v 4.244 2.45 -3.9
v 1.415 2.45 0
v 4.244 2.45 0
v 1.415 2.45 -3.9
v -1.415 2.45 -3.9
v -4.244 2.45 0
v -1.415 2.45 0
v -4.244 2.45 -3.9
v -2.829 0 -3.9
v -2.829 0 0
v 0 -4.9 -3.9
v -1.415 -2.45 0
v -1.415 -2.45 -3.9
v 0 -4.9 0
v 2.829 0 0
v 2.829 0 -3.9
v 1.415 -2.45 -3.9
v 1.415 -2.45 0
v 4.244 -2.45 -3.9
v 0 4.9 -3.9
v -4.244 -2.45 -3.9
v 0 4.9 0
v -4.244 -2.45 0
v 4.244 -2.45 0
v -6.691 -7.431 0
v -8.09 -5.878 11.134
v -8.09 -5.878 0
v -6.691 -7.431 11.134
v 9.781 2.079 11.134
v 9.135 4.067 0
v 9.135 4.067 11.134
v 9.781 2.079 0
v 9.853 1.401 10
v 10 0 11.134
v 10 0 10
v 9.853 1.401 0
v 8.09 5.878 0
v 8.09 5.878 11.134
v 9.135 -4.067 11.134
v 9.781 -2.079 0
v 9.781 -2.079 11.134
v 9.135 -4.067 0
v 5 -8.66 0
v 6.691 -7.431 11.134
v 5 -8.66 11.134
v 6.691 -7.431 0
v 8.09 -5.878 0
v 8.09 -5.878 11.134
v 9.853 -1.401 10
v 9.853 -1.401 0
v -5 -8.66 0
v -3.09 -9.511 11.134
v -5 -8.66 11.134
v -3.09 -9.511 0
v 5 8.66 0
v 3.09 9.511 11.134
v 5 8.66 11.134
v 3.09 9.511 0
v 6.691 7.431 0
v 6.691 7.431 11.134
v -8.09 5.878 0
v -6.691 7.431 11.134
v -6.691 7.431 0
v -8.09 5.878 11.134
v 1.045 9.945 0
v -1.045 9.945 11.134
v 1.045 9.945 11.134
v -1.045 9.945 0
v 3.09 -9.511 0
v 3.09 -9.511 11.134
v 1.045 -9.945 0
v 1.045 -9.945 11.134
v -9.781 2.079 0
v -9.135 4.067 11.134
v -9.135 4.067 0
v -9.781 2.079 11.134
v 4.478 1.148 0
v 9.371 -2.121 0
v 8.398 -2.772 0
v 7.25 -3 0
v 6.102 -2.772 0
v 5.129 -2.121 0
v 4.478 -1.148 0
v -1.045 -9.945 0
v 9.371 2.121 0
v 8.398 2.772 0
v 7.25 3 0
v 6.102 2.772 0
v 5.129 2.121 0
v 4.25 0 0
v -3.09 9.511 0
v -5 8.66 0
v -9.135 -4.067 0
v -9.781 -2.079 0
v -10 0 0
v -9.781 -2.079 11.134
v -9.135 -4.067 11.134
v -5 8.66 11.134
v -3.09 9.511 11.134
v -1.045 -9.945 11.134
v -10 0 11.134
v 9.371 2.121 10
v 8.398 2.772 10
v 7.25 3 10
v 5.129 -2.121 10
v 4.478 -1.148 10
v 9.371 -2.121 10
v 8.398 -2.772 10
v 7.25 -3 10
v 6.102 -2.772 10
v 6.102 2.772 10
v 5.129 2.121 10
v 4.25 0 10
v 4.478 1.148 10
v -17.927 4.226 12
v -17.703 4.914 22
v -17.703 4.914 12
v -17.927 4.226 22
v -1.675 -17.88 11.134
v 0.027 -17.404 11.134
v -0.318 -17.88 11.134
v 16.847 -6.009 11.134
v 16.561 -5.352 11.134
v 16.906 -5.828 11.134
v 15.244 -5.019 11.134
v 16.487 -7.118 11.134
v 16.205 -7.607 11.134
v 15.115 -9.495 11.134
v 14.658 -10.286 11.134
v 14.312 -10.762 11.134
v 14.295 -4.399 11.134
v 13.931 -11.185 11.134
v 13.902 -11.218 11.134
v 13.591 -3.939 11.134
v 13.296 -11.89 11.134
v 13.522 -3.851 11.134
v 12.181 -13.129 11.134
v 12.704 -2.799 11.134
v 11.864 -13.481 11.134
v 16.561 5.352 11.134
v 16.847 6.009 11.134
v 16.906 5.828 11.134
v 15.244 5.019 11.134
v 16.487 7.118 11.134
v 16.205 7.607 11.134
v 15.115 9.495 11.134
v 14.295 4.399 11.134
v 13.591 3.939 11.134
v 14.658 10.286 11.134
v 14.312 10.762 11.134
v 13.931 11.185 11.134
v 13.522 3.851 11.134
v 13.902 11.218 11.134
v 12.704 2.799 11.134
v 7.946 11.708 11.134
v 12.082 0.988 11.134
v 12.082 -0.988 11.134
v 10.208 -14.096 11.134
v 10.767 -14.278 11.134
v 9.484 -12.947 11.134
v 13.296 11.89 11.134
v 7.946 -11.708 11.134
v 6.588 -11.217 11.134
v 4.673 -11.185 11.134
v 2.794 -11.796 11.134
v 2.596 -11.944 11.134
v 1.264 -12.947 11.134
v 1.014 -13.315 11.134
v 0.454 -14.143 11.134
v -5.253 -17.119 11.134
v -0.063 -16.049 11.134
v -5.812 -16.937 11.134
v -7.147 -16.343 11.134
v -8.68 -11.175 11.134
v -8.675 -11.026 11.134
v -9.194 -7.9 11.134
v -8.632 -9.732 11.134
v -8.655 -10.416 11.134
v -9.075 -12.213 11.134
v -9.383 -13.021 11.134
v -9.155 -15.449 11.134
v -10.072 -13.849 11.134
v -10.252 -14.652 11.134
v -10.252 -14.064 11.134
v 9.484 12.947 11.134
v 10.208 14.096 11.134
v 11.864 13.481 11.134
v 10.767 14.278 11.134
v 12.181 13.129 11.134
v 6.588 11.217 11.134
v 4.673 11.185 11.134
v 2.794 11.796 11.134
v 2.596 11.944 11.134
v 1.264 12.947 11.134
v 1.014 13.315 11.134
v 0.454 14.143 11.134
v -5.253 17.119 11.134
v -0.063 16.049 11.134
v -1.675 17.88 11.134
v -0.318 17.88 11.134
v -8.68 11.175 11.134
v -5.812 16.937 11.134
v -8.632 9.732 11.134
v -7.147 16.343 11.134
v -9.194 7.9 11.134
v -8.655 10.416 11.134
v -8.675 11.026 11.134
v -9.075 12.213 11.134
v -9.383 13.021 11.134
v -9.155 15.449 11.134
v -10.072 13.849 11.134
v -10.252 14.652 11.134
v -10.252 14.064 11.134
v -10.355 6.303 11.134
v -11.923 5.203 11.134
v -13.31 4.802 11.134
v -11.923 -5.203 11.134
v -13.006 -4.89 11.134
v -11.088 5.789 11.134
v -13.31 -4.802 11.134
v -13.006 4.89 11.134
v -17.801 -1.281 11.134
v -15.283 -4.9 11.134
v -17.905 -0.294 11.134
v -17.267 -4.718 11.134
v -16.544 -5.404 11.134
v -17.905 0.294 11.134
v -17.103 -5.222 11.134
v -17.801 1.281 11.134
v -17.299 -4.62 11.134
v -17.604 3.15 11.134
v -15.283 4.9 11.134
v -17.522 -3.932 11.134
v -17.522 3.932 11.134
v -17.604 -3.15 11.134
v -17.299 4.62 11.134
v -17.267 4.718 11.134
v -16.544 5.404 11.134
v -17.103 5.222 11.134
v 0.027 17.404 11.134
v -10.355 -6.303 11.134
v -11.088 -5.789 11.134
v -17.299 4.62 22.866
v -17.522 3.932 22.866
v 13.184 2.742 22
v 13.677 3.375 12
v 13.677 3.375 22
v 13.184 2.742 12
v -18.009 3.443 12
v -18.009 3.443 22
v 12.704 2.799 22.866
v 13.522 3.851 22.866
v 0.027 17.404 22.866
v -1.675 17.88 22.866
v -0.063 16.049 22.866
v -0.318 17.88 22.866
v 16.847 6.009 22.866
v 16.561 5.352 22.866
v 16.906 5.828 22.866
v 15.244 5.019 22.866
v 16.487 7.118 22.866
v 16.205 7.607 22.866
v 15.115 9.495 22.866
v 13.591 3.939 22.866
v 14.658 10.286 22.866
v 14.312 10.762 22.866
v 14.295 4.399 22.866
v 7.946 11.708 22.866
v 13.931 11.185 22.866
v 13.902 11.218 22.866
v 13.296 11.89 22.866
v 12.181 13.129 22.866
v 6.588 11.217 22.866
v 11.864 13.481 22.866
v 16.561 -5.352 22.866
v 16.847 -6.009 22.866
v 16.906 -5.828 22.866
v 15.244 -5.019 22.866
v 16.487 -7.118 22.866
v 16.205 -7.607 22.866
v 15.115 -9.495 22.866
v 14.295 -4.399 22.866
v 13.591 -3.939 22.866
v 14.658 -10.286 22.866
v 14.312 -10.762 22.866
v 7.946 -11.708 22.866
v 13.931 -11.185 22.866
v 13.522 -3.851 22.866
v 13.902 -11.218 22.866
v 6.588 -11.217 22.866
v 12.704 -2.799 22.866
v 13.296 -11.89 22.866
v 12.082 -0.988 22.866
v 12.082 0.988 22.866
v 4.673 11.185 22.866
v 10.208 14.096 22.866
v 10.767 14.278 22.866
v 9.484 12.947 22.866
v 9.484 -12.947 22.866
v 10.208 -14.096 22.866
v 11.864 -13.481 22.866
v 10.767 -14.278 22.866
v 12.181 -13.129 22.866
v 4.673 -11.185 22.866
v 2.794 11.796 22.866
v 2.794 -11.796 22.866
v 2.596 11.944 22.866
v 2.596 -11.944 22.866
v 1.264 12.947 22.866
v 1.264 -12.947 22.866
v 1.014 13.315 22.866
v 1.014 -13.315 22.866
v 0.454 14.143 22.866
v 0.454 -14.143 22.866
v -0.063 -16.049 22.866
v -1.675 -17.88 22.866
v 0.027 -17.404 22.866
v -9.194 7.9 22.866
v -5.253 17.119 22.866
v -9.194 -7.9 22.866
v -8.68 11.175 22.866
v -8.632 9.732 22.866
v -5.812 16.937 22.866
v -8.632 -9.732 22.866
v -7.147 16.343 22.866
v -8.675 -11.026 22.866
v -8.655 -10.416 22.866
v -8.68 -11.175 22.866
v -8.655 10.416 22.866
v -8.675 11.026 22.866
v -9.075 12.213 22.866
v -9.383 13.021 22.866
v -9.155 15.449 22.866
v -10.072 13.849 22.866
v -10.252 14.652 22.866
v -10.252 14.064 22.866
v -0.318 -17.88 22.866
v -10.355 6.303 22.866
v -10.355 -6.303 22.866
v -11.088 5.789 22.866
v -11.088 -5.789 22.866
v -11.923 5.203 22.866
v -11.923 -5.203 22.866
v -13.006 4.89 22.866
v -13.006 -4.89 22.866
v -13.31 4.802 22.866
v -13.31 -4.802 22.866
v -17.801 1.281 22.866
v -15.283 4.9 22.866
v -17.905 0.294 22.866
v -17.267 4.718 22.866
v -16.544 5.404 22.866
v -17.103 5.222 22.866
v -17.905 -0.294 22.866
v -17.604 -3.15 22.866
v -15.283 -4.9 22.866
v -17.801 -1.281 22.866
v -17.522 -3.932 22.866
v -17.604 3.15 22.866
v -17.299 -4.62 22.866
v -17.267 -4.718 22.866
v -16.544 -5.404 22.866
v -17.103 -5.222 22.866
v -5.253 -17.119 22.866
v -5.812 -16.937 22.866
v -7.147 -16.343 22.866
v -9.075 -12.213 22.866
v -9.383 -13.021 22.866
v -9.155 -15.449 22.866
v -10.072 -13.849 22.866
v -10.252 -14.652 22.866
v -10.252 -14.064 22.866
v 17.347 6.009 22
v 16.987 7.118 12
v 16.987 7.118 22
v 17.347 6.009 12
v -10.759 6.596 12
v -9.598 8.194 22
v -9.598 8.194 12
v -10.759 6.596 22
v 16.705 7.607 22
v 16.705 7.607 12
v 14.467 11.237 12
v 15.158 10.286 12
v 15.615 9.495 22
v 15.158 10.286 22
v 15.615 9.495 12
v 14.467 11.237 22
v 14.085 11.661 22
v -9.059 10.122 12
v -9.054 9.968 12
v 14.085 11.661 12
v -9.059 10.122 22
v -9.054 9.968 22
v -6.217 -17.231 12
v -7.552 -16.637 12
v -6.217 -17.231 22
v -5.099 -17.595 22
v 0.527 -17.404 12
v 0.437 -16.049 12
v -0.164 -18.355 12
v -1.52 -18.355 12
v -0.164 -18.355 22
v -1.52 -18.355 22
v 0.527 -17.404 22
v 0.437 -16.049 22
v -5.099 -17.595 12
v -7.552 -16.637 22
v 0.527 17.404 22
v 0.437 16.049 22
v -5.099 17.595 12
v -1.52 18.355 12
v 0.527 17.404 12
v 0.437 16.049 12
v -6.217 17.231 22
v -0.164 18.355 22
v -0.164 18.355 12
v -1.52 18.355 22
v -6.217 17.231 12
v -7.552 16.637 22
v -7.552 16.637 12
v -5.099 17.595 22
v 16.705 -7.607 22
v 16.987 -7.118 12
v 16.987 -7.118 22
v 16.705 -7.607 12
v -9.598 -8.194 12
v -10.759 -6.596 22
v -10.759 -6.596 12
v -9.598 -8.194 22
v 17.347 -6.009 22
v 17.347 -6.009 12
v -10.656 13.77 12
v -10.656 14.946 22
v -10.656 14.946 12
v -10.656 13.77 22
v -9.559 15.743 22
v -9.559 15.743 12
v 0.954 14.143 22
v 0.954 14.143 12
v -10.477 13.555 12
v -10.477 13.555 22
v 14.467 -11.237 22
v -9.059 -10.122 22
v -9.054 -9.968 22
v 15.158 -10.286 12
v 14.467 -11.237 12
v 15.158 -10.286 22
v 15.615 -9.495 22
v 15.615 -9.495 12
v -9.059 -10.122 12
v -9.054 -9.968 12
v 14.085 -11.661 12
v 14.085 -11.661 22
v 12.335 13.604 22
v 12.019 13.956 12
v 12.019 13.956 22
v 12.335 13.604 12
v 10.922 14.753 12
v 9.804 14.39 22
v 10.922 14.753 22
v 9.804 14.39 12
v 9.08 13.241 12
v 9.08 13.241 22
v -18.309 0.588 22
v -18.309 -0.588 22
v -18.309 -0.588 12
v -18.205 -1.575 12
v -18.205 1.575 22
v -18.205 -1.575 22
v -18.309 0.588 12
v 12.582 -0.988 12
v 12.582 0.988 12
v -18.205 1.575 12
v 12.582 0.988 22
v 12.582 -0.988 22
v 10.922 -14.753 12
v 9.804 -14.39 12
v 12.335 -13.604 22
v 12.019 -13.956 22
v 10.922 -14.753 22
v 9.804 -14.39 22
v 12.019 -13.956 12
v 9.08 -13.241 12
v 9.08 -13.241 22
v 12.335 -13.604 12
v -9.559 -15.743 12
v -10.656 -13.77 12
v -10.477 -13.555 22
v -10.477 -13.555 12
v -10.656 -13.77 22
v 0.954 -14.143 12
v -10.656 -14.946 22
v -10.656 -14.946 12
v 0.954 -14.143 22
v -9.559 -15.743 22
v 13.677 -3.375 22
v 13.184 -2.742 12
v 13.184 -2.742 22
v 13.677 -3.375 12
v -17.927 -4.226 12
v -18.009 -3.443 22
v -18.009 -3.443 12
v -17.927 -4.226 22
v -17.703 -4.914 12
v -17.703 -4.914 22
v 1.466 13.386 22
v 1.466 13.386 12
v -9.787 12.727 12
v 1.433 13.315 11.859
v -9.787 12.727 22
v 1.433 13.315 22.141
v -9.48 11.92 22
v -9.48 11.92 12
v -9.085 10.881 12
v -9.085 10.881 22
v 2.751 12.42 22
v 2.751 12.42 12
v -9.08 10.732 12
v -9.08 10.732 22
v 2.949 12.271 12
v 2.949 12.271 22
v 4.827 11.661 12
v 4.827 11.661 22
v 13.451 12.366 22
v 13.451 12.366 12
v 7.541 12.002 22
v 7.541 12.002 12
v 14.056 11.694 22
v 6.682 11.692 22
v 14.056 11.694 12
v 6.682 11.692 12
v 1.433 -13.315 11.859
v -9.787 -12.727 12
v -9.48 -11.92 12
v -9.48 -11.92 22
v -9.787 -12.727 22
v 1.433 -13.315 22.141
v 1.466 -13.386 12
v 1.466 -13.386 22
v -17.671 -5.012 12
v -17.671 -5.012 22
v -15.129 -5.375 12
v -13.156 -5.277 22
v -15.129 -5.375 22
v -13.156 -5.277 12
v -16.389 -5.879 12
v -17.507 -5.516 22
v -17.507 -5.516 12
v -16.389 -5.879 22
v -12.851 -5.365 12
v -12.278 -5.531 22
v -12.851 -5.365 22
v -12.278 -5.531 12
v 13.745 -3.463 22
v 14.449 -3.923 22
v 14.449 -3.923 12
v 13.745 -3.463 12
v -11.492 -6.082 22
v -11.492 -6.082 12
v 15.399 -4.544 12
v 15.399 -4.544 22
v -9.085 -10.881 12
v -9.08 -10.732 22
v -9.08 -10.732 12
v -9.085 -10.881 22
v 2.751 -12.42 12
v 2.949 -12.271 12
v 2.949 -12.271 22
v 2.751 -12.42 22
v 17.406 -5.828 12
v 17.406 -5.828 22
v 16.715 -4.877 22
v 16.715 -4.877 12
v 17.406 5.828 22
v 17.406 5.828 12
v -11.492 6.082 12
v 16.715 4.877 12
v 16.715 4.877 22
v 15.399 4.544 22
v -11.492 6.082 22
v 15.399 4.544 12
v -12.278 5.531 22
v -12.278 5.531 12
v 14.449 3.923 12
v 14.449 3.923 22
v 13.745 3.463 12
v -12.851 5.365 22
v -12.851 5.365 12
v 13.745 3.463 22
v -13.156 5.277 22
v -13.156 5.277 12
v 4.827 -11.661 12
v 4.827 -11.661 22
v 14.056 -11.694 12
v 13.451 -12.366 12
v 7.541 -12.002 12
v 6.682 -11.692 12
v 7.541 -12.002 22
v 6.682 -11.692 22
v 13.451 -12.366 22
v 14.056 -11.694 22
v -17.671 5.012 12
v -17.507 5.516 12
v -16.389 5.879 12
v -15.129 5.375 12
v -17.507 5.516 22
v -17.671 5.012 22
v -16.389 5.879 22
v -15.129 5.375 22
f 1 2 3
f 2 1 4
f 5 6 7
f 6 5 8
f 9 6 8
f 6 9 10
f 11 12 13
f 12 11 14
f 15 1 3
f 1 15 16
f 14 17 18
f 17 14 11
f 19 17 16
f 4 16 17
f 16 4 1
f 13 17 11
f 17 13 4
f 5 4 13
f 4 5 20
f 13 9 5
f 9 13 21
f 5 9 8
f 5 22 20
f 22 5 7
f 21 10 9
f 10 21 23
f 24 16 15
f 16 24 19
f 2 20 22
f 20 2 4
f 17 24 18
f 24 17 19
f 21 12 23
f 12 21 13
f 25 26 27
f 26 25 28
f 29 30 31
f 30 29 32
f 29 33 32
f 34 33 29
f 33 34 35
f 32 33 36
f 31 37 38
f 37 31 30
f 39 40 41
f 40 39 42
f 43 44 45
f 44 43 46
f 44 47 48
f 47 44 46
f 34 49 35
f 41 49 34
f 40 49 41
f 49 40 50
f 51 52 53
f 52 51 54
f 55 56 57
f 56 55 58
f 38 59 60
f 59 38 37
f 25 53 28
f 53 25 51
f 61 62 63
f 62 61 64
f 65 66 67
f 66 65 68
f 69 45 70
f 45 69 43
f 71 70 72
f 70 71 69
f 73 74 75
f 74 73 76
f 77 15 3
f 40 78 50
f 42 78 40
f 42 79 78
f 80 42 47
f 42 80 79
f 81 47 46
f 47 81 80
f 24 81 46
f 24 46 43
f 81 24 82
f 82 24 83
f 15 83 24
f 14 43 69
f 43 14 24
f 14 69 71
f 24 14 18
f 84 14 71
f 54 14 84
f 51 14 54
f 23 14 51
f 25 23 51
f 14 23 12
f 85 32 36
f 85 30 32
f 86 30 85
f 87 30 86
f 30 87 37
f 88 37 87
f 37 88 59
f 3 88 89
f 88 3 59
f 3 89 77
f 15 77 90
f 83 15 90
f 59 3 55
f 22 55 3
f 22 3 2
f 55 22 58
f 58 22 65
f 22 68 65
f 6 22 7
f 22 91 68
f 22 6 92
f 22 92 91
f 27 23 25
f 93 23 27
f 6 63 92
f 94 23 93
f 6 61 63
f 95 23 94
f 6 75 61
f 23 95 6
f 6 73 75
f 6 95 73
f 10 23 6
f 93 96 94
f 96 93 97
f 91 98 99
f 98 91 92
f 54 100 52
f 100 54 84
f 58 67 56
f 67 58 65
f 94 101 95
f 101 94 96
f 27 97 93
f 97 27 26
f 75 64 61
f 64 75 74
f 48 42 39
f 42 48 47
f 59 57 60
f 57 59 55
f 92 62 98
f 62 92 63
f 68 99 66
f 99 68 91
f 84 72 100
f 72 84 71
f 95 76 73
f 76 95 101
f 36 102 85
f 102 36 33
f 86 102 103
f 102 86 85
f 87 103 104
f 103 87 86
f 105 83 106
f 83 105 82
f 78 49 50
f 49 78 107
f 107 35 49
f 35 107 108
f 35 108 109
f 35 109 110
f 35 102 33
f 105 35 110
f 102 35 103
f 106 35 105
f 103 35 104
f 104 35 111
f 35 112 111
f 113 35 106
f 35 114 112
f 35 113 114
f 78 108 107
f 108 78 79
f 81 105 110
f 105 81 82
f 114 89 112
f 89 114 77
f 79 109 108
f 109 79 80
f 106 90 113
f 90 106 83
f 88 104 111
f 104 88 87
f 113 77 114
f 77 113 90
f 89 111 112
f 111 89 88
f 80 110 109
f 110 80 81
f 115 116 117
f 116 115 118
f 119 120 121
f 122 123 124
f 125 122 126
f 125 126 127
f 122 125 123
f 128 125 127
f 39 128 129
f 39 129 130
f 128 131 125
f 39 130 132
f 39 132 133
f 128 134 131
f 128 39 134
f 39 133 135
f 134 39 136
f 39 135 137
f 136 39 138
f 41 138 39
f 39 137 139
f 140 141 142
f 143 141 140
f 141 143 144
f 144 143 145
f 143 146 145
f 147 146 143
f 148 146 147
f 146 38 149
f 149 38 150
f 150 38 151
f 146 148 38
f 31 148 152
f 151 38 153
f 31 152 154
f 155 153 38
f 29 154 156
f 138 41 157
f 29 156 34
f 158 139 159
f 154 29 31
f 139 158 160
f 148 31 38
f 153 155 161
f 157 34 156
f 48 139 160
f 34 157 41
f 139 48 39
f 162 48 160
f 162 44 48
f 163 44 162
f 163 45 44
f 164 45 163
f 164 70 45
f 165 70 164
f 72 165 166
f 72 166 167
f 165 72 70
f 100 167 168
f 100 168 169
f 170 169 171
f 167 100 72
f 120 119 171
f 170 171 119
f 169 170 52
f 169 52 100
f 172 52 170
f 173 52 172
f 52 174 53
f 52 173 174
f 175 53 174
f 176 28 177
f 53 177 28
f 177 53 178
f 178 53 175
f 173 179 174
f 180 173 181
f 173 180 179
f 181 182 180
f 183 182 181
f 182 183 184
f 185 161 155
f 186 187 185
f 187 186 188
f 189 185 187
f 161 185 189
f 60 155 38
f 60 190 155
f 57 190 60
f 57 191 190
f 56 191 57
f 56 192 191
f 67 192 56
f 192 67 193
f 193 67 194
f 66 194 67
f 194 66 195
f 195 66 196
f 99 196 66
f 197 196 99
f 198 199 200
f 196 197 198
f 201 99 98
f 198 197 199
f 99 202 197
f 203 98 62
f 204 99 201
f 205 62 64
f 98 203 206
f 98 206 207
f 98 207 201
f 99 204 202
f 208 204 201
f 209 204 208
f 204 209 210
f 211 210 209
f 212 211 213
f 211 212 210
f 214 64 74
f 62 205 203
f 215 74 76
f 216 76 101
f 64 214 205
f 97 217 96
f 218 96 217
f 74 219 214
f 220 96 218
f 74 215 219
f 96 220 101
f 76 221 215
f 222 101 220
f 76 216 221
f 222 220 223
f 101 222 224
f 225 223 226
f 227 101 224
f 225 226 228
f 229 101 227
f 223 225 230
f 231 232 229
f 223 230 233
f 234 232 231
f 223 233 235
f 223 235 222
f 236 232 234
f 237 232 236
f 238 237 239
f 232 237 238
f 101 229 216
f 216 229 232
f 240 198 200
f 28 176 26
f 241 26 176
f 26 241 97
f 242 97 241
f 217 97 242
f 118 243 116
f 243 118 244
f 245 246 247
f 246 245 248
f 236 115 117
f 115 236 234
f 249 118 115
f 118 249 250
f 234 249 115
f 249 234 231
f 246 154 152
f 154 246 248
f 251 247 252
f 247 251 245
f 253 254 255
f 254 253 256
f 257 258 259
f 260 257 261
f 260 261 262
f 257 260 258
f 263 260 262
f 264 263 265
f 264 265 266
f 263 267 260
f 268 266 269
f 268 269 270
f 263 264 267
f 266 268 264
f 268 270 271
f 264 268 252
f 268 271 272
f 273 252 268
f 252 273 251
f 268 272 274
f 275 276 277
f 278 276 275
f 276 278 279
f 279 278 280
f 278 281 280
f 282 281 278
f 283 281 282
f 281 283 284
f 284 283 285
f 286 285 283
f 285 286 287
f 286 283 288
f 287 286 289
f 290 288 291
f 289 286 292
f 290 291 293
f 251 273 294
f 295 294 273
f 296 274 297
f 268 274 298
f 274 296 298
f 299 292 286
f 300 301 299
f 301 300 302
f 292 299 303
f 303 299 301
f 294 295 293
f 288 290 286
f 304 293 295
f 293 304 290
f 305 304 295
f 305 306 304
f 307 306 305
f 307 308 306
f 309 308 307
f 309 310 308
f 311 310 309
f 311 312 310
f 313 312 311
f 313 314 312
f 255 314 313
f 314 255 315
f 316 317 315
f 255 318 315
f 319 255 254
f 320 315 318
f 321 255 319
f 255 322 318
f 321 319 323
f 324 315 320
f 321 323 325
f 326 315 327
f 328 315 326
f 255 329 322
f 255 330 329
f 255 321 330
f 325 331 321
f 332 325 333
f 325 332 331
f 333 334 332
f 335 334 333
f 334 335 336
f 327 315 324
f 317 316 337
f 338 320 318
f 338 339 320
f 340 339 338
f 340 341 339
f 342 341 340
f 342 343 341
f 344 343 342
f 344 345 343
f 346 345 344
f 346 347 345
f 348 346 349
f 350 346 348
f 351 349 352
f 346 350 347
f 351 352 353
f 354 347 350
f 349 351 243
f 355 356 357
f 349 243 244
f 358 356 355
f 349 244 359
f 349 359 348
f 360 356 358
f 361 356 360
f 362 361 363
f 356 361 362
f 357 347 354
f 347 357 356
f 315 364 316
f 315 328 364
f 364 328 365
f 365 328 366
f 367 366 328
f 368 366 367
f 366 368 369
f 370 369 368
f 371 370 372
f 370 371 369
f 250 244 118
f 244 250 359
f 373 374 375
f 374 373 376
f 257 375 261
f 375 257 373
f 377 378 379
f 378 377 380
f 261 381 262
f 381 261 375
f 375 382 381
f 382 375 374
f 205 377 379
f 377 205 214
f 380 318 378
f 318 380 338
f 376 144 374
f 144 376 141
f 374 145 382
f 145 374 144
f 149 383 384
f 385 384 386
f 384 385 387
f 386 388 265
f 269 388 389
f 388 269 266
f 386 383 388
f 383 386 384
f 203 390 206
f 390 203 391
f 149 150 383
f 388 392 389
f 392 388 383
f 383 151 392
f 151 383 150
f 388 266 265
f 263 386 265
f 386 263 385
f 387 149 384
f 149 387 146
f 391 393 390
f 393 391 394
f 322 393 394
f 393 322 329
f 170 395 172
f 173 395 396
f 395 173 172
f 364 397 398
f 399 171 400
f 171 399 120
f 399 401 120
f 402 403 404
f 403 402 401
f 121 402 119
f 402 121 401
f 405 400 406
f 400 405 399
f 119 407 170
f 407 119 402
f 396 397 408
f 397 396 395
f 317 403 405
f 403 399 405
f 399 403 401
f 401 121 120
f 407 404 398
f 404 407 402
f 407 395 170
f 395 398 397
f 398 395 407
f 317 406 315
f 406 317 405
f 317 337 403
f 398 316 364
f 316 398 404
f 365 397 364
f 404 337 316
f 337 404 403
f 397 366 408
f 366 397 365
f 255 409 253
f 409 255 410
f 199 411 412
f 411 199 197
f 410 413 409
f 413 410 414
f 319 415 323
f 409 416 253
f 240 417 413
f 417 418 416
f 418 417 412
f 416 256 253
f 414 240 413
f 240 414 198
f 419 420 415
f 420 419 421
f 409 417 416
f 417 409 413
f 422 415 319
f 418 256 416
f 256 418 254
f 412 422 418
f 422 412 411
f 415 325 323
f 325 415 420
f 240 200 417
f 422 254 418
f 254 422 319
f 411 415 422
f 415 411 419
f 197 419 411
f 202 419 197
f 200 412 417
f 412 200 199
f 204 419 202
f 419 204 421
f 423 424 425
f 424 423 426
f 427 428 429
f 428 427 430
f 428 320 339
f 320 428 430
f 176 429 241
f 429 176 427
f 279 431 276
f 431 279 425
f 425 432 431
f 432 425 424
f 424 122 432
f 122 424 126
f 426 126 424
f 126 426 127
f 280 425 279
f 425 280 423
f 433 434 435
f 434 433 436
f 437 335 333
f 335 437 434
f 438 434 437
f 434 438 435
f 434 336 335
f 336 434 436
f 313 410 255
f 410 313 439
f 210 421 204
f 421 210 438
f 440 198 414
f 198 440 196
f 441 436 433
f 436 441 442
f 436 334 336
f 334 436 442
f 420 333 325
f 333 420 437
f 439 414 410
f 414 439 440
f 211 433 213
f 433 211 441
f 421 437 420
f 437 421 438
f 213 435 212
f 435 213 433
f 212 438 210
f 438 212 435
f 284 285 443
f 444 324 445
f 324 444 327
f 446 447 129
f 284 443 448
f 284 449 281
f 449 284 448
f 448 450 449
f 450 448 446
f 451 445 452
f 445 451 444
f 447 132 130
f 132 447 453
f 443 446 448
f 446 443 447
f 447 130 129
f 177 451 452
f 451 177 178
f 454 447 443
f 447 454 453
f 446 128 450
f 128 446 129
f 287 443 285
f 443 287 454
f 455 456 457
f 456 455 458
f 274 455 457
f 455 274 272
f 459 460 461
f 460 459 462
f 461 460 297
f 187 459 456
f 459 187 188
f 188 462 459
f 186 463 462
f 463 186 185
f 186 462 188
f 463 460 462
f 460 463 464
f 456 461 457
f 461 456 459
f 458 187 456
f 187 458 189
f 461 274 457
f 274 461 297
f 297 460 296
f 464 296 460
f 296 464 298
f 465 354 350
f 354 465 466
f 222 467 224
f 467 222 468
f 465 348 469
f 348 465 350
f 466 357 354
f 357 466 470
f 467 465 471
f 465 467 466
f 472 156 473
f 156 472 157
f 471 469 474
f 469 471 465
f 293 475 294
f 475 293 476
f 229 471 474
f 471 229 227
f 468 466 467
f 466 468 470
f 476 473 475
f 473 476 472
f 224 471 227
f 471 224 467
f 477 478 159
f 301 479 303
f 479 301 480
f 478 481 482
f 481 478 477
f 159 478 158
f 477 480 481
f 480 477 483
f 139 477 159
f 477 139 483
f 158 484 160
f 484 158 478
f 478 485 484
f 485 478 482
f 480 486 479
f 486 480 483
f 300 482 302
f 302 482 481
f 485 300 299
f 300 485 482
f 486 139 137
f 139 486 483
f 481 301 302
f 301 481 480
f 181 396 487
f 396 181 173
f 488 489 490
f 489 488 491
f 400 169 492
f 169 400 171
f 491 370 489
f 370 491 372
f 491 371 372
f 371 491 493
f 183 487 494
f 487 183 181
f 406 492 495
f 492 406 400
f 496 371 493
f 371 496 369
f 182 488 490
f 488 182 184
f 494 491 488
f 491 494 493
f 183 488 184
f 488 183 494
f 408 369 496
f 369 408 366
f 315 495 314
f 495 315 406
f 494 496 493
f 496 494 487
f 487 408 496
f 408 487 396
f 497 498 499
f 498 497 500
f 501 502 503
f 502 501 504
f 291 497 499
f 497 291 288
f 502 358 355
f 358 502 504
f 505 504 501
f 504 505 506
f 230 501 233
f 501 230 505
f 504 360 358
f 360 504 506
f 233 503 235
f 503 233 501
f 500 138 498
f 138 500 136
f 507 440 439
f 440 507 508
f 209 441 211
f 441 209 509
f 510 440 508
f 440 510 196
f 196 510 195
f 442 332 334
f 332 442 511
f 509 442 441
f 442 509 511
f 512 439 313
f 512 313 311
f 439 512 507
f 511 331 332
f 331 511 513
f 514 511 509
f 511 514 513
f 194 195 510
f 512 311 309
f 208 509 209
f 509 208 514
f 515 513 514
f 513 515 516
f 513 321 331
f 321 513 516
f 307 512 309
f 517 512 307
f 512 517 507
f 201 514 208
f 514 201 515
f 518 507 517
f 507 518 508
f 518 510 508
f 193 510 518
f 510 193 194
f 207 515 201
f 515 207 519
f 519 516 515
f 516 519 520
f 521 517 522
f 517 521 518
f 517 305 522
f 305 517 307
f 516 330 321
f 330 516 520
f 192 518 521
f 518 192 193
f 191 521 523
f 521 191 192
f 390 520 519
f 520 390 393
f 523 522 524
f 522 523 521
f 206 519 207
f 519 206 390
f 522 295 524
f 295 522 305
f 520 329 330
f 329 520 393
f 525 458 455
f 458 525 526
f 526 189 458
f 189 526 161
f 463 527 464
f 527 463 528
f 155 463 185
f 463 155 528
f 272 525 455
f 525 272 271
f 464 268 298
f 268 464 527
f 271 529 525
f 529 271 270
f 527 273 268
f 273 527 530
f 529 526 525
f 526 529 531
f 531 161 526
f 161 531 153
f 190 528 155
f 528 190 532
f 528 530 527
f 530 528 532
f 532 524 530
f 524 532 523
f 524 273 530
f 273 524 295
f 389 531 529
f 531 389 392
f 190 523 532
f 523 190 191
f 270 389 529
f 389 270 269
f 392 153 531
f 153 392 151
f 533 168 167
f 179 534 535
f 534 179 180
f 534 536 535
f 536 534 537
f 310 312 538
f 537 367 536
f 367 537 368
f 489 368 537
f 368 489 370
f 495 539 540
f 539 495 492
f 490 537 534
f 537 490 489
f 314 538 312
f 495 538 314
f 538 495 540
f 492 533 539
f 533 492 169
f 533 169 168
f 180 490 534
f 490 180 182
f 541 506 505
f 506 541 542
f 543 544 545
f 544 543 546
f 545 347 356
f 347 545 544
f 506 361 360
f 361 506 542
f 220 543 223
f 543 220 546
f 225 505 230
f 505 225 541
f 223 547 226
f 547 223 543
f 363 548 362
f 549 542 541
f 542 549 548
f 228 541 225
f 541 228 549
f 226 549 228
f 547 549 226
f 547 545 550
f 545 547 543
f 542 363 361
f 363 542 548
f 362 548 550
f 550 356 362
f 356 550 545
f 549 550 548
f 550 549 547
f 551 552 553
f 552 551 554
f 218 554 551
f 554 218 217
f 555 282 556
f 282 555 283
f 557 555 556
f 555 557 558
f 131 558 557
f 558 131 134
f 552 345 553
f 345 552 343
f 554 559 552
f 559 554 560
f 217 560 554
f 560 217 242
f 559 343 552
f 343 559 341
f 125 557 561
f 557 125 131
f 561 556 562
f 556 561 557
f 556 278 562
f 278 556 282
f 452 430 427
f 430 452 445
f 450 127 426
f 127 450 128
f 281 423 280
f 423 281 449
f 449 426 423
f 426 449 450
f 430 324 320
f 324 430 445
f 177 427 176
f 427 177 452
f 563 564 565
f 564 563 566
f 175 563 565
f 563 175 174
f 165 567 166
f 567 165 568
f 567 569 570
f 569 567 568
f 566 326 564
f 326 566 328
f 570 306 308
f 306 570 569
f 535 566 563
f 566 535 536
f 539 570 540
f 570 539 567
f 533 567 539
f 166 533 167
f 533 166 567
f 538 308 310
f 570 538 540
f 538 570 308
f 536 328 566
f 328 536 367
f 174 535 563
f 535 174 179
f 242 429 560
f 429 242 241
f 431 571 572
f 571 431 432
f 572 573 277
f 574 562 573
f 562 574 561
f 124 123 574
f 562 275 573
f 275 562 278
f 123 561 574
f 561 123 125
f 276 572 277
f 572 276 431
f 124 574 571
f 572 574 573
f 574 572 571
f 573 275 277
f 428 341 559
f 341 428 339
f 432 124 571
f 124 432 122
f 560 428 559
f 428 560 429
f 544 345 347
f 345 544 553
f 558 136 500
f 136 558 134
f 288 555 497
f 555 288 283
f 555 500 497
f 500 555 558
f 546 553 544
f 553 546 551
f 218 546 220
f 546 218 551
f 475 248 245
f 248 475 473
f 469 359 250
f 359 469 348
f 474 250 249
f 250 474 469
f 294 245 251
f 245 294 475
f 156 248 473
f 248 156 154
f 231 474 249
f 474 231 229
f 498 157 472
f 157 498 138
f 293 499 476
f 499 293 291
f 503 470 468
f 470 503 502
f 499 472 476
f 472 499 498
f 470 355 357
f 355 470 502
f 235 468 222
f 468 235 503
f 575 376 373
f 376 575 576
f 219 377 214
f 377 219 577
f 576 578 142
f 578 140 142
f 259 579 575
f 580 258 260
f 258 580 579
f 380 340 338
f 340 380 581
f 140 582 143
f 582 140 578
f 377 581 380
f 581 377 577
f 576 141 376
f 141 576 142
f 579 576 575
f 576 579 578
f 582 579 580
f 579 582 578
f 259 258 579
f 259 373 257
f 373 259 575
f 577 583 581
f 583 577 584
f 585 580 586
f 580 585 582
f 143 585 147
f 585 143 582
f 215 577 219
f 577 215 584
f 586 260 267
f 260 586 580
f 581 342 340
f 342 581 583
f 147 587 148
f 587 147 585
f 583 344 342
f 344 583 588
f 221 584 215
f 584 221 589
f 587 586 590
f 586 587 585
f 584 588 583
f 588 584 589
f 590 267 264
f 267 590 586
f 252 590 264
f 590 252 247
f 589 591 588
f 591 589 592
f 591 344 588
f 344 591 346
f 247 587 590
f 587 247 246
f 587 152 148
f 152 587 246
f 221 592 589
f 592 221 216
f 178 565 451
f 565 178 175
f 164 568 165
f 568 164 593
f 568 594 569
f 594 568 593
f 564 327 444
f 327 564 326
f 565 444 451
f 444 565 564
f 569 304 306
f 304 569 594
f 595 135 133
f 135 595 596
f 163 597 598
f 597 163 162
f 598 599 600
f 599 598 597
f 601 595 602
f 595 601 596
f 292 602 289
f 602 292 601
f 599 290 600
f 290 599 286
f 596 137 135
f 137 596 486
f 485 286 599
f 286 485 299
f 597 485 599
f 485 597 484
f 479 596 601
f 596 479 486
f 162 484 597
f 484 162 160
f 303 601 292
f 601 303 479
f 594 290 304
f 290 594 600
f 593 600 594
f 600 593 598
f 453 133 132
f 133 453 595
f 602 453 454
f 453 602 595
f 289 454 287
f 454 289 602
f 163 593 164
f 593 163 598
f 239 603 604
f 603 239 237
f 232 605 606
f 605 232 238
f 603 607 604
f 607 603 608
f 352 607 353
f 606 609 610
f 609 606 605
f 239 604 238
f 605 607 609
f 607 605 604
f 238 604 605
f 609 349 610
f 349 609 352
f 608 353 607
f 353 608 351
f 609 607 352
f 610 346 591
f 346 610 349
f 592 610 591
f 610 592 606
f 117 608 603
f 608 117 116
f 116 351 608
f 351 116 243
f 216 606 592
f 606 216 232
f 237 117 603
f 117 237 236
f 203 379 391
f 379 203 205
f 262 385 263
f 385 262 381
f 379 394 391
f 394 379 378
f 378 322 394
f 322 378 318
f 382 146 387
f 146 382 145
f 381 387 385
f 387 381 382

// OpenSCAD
// distance plate diameter
dd = 20;
// distance plate depth
distance = 12;

// thumb wheel diameter
thumb = 35;
// thumb wheel depth
td = 10;
// notches
notches = 5;
// notch diameter
nd = 12;

tolerance=0.1;

// parameters from the connector

// diameter of the outer hole
outer = 17.5;

// inset of the current handle
inset = 1.5;
// diameter of the current handle
pin = 6;
// length of the current handle
plen = 10;

// diameter of the center plug
plug = 10;
// depth of the center plug
h_plug = 4;
// sides of the center plug x 2
sides = 3;

translate([0,0,-h_plug+tolerance]) {
  rotate([0,0,30])
    cylinder(r=plug/2-tolerance, h=h_plug, $fn=sides);
  rotate([0,0,-30])
    cylinder(r=plug/2-tolerance, h=h_plug, $fn=sides);
}

difference() {
  cylinder(r=dd/2, h=distance);
  translate([outer/2-inset, 0, 0])
    cylinder(r=pin/2, h=plen, $fn=16);
}

minkowski() {
  translate([0,0,distance])
    difference() {  
      cylinder(r=thumb/2, h=td);
  
      for(i=[0 : 360/notches : 360]) 
        rotate([0,0,i])
          translate([thumb/2,0,0])
            cylinder(r=nd/2, h=td);
    }
  sphere(1);
}
